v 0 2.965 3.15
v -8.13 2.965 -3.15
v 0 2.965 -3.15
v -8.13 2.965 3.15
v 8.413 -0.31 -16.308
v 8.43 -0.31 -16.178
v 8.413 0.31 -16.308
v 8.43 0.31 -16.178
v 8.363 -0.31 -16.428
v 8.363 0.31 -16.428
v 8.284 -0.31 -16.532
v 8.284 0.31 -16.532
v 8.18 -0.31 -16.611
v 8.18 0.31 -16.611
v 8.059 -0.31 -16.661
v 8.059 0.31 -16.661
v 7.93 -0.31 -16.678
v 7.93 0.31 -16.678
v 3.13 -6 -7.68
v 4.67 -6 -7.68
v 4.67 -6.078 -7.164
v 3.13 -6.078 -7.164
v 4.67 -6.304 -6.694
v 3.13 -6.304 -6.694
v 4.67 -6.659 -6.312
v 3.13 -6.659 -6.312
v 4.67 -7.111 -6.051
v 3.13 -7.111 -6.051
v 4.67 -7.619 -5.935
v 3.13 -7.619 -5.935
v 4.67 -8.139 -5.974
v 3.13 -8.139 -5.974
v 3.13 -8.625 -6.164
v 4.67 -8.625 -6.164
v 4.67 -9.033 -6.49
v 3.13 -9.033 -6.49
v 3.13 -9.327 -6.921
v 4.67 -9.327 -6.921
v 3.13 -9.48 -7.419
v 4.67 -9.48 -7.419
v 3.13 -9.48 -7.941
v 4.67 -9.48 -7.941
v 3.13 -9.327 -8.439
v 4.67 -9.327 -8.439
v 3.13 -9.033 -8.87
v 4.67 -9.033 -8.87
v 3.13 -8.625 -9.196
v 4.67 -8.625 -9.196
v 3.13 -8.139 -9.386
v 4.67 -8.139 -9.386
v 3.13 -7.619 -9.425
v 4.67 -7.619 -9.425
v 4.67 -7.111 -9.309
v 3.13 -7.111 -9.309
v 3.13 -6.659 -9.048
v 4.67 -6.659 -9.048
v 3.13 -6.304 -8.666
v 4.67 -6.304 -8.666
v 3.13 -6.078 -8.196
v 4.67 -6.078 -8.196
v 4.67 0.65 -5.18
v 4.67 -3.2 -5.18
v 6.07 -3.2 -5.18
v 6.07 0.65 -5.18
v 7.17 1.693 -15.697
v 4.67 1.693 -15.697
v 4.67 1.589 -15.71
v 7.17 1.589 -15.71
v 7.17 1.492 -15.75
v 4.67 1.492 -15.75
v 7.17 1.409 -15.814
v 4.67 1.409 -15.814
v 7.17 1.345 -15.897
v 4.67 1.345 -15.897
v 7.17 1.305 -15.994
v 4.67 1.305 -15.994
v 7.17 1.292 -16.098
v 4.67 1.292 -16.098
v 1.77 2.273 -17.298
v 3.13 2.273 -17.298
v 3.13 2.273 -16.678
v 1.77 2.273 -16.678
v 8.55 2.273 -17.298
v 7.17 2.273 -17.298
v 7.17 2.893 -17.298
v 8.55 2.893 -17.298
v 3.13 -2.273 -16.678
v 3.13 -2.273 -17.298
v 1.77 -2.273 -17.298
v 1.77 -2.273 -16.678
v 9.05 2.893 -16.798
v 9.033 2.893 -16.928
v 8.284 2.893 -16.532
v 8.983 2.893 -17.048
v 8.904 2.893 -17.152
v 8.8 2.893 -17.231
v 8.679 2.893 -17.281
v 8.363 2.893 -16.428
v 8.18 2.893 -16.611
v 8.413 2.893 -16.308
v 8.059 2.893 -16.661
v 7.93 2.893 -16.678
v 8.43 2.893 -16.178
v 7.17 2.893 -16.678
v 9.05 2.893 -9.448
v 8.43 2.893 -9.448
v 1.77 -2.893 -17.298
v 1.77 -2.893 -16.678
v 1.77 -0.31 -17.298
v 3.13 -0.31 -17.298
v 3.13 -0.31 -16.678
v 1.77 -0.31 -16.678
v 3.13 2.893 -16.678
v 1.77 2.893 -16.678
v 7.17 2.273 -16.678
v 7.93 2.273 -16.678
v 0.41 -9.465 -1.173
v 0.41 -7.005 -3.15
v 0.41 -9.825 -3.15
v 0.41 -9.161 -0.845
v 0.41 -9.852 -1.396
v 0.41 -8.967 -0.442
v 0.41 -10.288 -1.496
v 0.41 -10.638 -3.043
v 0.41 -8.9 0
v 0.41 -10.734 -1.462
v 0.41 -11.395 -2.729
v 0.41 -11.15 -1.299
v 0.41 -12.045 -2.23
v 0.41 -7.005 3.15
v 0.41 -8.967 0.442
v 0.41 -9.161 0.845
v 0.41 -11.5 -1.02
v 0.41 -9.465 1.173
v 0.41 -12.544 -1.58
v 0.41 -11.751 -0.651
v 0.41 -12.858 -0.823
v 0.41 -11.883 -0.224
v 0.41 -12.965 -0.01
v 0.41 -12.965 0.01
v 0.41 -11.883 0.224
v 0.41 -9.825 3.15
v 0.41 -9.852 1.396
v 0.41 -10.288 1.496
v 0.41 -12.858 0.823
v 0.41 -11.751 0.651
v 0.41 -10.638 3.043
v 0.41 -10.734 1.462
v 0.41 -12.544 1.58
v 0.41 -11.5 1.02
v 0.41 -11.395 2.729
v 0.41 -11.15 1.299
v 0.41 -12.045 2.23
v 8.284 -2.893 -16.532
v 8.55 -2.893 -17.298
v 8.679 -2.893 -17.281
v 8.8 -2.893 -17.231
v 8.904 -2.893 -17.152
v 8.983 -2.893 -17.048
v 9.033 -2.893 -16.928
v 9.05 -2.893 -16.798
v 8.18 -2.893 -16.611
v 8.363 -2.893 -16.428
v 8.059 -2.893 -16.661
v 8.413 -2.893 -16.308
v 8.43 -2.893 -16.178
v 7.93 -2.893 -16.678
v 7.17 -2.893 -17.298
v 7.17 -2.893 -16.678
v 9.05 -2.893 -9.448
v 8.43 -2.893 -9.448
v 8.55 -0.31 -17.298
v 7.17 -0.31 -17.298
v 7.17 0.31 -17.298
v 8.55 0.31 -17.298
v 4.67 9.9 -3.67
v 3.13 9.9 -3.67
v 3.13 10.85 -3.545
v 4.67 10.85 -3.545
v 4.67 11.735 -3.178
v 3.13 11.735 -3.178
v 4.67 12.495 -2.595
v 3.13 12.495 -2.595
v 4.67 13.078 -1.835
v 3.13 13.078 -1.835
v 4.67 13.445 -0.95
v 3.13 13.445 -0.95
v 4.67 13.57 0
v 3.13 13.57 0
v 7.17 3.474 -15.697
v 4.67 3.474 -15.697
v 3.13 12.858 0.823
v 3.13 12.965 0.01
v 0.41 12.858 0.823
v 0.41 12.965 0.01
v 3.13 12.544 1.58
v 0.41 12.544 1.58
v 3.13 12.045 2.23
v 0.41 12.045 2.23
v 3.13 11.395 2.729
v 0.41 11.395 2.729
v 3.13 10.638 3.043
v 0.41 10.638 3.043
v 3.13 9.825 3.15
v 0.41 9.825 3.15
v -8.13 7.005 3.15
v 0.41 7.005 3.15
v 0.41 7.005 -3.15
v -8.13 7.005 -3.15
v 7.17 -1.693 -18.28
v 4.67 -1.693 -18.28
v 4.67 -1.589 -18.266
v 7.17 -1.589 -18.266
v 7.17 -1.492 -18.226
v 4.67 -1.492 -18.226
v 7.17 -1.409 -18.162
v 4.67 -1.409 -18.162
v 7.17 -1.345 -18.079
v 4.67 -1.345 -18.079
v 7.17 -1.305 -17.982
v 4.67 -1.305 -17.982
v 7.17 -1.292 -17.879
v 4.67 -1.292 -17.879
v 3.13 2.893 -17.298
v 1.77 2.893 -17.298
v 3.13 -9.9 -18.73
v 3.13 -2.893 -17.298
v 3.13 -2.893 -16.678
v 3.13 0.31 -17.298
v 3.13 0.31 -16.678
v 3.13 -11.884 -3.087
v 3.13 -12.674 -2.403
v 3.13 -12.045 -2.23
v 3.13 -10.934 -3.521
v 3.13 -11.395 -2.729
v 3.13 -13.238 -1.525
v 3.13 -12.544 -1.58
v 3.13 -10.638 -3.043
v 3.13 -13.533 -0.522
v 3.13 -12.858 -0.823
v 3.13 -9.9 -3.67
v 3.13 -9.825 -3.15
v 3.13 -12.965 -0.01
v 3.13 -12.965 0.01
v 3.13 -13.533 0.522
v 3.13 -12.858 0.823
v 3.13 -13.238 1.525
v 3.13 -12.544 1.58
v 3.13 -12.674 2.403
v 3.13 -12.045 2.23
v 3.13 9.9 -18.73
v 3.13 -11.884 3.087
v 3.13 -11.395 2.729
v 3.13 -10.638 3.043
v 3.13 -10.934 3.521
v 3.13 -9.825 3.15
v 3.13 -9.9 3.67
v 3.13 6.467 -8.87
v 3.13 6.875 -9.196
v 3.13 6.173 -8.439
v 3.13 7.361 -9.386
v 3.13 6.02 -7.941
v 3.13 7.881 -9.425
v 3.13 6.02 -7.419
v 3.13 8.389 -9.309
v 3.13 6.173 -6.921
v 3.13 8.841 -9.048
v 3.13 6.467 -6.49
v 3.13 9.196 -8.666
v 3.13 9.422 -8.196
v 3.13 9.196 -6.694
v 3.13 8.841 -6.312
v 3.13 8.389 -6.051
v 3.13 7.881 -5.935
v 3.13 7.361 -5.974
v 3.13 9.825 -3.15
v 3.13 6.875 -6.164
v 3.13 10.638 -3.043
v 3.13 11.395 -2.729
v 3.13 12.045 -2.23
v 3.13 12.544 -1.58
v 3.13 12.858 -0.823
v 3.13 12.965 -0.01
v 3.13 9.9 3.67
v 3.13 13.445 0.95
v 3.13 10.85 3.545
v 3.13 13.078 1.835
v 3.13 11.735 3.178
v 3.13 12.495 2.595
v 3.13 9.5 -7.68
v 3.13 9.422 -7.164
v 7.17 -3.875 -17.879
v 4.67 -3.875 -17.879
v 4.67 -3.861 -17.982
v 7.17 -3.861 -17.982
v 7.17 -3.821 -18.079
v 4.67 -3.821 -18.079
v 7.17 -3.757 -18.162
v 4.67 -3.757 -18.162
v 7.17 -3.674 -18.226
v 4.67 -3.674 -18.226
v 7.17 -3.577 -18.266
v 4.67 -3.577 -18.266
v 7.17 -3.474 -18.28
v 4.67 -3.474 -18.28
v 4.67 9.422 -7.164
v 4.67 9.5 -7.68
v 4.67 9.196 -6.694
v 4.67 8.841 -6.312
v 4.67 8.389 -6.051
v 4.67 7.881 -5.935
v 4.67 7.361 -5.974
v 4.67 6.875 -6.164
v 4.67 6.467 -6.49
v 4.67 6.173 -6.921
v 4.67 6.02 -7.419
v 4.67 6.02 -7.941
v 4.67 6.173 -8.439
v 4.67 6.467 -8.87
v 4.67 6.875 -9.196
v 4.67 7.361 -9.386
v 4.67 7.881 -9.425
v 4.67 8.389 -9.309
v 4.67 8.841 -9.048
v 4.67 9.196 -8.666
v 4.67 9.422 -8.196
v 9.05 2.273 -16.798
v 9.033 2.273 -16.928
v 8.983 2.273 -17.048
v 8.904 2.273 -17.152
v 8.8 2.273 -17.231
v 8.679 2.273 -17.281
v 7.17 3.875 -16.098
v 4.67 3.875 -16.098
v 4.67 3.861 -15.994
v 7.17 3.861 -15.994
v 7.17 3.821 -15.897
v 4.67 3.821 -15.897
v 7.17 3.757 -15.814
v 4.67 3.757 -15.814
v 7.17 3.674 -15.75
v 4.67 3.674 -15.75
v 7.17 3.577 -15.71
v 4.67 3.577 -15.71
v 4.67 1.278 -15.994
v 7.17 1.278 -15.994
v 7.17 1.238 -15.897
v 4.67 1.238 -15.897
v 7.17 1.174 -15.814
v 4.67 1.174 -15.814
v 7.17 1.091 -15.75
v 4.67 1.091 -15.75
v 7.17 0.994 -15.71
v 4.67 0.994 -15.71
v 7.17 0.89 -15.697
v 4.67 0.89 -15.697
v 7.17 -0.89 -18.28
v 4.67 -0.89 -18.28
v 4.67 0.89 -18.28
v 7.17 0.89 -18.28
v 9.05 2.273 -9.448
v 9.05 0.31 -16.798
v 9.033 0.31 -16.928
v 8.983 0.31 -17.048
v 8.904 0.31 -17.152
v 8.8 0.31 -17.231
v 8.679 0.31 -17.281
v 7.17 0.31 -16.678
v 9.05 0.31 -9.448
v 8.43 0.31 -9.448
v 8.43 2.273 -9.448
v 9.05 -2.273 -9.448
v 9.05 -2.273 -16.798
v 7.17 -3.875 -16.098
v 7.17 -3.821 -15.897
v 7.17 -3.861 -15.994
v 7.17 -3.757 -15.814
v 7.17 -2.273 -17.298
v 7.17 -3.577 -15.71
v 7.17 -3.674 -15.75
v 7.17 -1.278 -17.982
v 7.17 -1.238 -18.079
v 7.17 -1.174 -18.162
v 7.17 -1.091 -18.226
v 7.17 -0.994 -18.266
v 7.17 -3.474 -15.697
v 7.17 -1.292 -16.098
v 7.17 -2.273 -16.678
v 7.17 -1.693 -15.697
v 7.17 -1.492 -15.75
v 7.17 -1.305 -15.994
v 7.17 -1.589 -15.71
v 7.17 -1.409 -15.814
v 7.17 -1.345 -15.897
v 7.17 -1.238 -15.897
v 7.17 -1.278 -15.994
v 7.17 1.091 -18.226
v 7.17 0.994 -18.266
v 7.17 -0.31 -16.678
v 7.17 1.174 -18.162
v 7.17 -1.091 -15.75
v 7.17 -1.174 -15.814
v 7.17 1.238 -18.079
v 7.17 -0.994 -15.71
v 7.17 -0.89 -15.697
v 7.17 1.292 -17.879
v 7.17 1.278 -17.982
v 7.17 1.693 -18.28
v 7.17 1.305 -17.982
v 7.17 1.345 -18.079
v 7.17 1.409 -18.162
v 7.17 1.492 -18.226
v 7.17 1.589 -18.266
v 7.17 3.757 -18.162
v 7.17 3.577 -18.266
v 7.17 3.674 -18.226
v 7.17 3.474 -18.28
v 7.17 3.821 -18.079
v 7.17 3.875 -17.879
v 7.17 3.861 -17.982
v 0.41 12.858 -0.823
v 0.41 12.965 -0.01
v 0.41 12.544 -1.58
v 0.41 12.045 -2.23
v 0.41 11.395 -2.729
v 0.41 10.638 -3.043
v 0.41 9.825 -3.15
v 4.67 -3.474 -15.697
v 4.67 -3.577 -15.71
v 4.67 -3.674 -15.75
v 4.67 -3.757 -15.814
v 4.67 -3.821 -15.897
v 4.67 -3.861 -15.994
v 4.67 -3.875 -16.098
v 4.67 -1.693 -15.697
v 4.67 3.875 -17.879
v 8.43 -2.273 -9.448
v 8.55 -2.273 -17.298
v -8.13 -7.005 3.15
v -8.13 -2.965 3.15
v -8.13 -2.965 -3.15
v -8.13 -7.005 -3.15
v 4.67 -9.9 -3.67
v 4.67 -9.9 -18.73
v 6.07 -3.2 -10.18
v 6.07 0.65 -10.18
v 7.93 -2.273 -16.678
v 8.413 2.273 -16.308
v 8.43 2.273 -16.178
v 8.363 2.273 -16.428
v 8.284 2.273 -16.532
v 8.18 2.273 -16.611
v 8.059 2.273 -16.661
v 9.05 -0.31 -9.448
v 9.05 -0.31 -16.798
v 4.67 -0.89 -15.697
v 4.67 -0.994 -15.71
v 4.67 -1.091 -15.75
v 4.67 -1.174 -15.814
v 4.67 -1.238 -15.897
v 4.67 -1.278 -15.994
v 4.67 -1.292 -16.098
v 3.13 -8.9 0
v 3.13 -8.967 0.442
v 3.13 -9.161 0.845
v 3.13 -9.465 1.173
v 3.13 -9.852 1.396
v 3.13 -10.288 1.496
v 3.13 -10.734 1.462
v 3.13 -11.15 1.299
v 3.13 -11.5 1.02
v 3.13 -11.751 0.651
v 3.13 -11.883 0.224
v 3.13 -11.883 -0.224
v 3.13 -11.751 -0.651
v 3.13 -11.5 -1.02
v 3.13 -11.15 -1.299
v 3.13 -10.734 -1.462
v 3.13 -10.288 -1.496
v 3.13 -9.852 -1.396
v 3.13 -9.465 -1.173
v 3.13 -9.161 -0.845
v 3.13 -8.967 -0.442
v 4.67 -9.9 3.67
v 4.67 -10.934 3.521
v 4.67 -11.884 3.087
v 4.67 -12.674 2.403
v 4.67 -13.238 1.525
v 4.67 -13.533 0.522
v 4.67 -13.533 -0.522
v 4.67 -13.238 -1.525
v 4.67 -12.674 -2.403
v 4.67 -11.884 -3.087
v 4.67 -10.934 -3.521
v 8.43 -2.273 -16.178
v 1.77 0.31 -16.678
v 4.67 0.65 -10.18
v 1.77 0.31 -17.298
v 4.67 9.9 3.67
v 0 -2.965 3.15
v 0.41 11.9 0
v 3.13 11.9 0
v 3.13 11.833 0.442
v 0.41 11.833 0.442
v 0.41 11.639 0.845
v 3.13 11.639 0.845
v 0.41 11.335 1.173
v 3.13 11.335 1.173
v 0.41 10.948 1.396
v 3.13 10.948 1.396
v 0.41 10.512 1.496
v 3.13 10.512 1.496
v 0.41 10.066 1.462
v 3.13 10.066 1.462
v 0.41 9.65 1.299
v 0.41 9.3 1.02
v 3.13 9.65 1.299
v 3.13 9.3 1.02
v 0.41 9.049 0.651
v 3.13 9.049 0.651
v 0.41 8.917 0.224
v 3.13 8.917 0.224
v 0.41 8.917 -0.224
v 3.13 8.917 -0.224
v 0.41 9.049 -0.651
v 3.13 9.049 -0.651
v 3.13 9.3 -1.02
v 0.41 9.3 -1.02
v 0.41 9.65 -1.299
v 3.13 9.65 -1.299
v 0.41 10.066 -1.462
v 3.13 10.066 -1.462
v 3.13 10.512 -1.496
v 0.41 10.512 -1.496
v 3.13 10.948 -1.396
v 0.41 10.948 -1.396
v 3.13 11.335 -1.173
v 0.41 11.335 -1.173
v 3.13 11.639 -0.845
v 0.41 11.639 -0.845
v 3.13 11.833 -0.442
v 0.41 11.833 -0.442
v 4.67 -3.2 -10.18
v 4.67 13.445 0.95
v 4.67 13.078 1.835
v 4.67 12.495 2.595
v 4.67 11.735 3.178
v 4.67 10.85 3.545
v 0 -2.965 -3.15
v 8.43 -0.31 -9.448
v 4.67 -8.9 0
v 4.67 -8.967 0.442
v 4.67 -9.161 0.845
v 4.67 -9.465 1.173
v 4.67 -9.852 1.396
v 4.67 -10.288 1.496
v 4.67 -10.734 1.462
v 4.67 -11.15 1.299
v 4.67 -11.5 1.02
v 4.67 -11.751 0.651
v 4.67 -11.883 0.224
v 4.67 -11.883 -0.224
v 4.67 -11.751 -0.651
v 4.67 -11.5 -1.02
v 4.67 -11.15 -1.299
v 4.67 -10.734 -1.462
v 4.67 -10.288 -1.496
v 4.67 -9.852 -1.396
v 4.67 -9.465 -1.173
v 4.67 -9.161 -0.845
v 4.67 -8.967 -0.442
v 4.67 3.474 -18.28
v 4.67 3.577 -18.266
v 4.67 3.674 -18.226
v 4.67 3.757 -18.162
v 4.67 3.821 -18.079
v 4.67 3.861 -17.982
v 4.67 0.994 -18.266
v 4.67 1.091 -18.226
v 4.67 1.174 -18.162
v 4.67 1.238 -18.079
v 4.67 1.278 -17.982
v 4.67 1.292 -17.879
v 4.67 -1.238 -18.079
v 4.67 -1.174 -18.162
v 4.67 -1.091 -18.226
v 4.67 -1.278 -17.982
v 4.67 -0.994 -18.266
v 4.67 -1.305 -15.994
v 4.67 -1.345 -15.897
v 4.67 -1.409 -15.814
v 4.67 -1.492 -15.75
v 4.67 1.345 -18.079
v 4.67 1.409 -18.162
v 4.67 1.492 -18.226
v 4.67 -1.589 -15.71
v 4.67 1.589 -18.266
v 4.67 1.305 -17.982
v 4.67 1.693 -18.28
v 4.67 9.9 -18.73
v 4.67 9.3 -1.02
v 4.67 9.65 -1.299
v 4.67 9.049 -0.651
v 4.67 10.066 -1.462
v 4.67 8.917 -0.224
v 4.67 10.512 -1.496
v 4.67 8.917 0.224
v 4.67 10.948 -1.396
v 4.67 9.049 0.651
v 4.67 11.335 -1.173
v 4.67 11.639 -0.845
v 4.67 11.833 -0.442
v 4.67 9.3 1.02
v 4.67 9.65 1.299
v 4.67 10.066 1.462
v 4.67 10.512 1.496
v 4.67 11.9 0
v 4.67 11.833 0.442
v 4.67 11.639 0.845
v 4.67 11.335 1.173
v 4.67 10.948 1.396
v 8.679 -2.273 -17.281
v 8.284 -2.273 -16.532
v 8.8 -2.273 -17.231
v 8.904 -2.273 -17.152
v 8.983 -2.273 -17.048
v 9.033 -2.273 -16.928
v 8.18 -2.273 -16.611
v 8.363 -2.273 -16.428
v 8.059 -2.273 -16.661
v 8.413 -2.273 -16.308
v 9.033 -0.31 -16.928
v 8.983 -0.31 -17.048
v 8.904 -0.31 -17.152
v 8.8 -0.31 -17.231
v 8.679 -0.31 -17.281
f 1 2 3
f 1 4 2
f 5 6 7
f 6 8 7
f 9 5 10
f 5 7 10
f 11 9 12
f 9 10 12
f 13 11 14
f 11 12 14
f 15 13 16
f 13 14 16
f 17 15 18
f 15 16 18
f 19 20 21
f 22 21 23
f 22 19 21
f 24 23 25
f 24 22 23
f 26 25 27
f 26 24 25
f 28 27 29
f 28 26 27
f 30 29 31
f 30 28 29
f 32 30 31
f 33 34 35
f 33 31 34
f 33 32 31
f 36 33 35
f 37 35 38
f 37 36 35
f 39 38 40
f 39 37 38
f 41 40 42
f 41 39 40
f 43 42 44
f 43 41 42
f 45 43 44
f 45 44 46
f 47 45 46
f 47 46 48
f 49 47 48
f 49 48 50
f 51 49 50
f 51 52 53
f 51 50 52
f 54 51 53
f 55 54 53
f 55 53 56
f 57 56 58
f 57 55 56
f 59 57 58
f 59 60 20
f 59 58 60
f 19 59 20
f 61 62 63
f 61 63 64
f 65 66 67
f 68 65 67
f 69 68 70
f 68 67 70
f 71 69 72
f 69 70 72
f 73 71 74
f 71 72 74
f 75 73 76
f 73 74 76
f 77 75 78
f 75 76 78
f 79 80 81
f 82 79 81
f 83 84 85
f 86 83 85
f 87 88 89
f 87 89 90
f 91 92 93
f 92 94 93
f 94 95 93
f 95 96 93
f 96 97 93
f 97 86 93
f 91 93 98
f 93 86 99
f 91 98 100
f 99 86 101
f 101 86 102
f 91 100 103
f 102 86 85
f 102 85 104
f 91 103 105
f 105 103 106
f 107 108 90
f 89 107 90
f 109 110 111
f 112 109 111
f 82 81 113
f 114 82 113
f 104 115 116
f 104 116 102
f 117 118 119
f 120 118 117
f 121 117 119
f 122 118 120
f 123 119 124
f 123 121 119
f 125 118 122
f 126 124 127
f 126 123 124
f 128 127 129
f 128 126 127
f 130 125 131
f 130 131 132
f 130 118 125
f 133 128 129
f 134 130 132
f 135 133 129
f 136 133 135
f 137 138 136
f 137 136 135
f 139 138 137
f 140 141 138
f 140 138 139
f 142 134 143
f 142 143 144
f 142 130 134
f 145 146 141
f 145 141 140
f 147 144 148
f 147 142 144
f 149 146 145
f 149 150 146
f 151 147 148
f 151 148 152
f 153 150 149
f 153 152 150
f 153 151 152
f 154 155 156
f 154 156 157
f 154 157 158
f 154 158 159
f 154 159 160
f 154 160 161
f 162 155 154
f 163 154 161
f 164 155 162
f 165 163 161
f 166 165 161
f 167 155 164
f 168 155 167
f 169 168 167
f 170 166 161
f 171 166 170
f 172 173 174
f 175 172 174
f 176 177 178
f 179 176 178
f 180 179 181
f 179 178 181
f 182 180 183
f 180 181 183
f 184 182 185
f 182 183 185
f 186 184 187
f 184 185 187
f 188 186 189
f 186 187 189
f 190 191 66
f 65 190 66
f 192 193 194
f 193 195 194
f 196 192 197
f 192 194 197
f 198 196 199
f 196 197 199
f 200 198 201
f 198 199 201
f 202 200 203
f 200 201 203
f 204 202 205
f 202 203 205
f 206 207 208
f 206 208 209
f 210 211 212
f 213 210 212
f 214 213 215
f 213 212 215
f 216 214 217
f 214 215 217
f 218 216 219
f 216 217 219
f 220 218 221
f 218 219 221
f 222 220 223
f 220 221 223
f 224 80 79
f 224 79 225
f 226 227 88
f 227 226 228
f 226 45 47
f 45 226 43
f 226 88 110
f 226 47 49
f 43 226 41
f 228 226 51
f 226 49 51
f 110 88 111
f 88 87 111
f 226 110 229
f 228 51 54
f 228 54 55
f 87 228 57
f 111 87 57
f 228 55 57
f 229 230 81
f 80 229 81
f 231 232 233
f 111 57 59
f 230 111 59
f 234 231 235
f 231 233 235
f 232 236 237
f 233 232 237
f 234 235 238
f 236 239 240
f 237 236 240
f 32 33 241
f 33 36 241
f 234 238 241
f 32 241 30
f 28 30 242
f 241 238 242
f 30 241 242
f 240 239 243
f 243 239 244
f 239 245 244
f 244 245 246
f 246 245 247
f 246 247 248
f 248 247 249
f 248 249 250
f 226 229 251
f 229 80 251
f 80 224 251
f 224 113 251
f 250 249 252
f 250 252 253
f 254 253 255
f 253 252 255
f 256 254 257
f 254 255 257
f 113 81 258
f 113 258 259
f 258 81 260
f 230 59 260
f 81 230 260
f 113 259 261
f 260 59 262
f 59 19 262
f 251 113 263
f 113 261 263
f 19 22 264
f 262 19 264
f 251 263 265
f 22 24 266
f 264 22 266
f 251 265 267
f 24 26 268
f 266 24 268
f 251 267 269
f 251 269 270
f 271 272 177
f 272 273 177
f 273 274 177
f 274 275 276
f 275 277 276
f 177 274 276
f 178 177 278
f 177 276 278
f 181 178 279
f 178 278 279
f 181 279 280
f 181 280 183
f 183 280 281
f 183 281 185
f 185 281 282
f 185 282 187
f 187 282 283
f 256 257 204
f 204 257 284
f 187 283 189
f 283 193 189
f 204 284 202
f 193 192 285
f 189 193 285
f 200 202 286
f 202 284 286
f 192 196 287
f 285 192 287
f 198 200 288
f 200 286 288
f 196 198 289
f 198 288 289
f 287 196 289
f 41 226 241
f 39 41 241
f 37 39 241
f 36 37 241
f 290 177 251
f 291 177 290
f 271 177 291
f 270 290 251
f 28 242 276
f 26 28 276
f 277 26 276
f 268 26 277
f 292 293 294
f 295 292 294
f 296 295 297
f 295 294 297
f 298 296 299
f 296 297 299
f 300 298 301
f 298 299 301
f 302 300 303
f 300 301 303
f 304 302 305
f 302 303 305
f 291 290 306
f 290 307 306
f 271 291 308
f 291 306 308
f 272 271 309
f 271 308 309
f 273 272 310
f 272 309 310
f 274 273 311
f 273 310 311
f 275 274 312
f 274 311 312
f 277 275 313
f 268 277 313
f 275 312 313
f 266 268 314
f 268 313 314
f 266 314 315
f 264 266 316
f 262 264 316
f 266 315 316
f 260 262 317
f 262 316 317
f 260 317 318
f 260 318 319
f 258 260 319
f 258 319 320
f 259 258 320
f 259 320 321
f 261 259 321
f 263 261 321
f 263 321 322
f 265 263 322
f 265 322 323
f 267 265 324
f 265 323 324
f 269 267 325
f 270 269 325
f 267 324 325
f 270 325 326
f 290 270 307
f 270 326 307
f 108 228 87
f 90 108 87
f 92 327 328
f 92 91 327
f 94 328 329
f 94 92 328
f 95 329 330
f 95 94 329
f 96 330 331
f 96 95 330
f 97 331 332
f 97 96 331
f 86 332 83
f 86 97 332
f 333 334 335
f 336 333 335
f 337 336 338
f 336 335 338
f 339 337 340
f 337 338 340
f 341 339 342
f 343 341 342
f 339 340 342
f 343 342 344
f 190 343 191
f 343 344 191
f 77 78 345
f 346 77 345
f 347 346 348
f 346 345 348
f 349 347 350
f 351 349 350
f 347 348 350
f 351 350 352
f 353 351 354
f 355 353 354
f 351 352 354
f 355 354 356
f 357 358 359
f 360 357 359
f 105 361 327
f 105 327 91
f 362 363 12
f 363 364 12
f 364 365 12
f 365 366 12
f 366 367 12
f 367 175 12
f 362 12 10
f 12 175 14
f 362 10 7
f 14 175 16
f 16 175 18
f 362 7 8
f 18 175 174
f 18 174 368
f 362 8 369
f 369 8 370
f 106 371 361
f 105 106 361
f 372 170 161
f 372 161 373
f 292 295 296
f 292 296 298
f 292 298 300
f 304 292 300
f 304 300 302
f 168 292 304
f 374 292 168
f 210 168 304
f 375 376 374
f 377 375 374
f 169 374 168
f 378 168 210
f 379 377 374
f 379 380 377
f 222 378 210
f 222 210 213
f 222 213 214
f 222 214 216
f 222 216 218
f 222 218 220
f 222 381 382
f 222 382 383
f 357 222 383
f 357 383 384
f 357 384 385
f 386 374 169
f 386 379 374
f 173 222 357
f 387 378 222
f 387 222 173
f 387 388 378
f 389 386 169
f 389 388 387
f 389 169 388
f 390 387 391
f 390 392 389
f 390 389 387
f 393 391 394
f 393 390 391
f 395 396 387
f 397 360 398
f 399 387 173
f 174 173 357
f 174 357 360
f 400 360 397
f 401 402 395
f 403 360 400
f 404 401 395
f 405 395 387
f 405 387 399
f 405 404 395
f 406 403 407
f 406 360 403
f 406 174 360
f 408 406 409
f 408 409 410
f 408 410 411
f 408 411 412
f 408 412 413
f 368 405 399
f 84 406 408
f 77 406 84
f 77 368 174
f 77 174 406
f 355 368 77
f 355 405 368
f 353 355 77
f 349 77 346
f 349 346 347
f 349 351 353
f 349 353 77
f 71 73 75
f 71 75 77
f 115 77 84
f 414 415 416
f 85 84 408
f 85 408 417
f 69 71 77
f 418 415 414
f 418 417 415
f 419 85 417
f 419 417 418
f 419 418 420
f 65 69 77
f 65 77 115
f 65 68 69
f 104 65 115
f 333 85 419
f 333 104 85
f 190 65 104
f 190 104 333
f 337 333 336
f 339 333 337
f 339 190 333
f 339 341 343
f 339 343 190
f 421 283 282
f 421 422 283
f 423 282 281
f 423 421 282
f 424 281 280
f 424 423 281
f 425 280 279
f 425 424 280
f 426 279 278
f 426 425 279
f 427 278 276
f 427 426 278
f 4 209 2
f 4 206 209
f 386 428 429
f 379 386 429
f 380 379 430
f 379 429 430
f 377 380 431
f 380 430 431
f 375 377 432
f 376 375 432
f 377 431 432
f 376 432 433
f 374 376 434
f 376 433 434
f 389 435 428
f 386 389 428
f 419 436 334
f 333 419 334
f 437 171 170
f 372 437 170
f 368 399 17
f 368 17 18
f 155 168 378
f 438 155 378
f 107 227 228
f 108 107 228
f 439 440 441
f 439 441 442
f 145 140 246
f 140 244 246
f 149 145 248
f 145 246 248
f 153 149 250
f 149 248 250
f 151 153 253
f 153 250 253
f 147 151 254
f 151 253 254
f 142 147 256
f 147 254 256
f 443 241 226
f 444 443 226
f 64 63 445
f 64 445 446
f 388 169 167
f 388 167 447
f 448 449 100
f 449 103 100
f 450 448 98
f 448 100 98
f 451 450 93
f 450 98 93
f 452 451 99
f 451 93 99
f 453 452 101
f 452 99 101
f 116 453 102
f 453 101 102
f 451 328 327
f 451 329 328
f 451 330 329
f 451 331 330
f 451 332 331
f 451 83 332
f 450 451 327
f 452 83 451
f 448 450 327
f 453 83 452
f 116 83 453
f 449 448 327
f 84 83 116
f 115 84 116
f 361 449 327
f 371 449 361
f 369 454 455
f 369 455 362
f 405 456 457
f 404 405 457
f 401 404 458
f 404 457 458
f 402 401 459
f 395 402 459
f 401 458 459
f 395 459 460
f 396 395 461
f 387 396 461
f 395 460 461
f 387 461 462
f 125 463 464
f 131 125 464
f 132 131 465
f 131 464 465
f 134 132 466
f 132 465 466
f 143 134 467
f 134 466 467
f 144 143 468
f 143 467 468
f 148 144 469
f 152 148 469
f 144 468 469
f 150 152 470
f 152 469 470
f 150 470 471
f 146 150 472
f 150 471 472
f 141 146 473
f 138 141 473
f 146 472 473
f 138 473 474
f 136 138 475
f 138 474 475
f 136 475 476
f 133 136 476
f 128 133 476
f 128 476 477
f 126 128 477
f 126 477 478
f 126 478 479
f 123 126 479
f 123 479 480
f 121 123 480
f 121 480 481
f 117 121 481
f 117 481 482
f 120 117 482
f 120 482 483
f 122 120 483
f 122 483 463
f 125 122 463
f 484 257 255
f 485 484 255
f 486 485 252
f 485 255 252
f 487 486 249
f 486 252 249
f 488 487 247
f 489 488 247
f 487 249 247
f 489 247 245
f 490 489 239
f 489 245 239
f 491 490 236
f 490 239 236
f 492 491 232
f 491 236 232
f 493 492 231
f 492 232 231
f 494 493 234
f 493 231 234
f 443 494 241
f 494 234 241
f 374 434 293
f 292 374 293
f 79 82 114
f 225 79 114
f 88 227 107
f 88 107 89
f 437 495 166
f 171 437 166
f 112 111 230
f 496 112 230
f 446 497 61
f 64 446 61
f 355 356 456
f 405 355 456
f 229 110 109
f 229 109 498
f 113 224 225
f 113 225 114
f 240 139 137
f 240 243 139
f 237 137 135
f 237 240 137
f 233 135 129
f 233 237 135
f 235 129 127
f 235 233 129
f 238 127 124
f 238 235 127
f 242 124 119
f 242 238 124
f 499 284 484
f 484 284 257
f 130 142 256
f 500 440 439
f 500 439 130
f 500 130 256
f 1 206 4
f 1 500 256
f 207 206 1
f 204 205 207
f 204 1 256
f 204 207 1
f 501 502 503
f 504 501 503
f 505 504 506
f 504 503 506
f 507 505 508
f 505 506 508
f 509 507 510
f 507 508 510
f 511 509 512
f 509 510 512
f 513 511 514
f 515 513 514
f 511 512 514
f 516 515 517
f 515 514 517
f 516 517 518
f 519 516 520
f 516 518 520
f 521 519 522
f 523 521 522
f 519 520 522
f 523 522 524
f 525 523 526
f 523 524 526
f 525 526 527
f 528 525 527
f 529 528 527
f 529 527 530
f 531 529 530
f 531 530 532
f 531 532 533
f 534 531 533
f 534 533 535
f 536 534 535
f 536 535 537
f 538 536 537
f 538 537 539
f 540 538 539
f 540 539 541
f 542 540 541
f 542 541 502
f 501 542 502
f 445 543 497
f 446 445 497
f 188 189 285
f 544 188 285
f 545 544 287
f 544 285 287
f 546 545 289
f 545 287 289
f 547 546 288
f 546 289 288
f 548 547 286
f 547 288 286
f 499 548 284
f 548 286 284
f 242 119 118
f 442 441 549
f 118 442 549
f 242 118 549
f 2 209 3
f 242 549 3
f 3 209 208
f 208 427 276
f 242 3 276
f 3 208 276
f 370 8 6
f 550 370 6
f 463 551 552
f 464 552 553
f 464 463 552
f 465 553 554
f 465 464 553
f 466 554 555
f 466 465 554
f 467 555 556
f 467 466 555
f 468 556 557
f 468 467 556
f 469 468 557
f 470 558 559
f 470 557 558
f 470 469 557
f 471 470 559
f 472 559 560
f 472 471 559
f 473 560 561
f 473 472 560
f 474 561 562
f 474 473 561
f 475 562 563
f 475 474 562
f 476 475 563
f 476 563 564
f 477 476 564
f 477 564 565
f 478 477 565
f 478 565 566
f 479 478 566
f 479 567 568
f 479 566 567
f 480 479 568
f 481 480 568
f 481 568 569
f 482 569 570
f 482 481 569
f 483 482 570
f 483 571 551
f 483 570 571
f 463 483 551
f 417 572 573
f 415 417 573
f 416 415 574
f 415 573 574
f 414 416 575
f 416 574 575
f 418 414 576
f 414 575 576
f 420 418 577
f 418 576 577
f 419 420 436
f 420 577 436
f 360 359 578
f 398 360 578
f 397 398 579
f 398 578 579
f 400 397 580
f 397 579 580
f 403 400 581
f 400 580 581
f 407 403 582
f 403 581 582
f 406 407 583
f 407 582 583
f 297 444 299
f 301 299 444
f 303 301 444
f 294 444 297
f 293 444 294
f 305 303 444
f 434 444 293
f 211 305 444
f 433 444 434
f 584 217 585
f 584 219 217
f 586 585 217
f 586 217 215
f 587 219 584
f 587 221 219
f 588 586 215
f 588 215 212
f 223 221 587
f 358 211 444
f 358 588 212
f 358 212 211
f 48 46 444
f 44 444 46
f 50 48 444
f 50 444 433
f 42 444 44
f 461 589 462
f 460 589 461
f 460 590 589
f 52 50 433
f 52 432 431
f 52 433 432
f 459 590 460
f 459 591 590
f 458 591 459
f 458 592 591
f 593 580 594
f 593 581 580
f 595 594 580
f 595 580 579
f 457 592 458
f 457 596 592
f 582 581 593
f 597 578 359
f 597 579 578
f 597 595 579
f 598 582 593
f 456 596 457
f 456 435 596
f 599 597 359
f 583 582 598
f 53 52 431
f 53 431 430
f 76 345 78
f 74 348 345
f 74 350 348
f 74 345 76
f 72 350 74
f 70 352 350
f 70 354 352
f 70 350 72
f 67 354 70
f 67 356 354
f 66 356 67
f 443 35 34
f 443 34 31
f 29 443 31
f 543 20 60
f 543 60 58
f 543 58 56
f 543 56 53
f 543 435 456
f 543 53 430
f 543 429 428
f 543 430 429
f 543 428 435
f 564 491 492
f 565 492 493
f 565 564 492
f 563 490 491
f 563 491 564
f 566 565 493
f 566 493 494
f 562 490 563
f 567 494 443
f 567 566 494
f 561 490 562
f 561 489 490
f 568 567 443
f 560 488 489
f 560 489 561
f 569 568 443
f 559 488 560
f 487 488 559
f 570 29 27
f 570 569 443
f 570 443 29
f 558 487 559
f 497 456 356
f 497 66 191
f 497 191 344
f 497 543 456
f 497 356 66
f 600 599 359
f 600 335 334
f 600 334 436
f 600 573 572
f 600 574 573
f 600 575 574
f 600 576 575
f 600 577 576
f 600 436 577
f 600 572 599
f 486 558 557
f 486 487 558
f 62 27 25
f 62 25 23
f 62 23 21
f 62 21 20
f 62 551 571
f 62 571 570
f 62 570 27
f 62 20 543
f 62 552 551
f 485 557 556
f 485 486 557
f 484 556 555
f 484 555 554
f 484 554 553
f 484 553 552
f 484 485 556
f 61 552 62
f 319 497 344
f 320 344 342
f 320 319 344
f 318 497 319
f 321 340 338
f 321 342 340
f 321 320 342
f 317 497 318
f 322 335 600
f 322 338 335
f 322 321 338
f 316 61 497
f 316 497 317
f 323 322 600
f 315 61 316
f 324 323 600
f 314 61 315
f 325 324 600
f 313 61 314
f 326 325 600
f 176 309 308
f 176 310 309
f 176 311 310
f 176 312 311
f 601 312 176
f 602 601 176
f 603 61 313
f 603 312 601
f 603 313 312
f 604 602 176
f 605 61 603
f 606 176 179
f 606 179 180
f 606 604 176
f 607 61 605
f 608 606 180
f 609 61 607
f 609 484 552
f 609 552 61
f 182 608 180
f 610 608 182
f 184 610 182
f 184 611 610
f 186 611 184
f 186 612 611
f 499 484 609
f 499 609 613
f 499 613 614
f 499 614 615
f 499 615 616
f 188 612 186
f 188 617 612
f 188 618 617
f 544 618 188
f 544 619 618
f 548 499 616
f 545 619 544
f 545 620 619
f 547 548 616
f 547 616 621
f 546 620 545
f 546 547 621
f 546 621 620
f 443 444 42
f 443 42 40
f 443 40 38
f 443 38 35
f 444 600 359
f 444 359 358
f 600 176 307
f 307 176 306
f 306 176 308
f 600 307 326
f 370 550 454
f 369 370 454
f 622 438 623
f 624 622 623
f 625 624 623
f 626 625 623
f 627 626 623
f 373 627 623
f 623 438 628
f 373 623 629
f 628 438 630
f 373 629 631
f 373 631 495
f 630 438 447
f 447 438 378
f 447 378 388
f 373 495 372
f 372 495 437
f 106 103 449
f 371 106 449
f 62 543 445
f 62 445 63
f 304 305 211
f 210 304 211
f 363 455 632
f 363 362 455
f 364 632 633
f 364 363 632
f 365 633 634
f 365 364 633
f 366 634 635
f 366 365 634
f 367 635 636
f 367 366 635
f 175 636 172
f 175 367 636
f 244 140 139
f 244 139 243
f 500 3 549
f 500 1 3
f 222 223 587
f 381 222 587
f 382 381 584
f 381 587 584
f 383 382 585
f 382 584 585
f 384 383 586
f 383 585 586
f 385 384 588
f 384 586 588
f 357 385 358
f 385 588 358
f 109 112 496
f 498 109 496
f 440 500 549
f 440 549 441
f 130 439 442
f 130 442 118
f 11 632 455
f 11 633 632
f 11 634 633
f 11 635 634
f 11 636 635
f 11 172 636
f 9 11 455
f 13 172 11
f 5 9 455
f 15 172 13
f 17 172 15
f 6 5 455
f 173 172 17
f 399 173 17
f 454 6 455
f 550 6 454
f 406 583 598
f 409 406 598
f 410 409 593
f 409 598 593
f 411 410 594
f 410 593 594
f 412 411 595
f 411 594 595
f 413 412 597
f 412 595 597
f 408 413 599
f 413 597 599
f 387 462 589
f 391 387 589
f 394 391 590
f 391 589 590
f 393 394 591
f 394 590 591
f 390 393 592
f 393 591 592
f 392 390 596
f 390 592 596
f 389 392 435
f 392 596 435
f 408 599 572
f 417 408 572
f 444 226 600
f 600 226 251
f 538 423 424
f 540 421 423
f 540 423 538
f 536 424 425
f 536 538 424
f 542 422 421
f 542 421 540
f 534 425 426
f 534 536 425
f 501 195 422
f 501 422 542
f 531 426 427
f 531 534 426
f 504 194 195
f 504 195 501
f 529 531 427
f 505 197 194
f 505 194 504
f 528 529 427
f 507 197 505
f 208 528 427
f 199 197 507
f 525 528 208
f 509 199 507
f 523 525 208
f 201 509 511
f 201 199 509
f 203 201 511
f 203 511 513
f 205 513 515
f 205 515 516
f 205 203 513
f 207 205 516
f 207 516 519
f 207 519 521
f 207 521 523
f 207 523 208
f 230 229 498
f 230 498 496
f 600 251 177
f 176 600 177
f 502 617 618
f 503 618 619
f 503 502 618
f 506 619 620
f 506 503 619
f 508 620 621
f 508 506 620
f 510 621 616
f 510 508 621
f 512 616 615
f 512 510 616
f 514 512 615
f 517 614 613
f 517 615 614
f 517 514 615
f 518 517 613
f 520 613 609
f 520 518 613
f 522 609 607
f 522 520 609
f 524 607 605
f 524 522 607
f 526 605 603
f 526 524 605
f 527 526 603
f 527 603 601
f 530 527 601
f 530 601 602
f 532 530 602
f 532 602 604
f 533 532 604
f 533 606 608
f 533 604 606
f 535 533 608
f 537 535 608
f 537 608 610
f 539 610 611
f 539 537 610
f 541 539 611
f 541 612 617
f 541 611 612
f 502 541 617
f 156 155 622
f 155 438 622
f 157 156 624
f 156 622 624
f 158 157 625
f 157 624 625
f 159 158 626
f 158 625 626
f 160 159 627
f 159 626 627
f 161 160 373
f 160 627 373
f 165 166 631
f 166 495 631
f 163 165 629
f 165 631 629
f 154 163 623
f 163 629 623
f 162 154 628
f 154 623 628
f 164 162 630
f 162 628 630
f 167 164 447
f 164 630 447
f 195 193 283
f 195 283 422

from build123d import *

# Parameters (mm, degrees)
F1_DEPTH  = 3.15
F2_R      = 3.14
F5_DEPTH  = 1.54
F4_R      = 1.5
F4_R_2    = 1.75
F6_DEPTH  = 12.5
F8_DEPTH  = 2.5
F9_W      = 0.62
F9_H      = 0.62
F10_DEPTH = 1.88
F11_W     = 0.62
F11_H     = 0.62
F12_DEPTH = 1.36
F13_W     = 0.62
F13_H     = 0.62
F14_DEPTH = 7.85
F15_R     = 0.5
F16_W     = 3.85
F16_H     = 5
F17_DEPTH = 1.4


with BuildPart() as f1:
    # F0 (on Top) → F1 (new body, symmetric)
    with BuildSketch(Plane.XY):
        Polygon((0, 2.965), (0, 0), (0, -2.965), (-8.13, -2.965), (-8.13, -7.005), (0.41, -7.005), (0.41, -12.965), (3.13, -12.965), (3.13, 0), (3.13, 12.965), (0.41, 12.965), (0.41, 7.005), (-8.13, 7.005), (-8.13, 2.965), align=None)
    extrude(amount=F1_DEPTH, both=True)

    # F2
    f2_edges = [f1.edges().sort_by_distance(p)[0] for p in [
        (1.77, 12.965, 3.15),
        (1.77, 12.965, -3.15),
        (1.77, -12.965, 3.15),
        (1.77, -12.965, -3.15),
    ]]
    fillet(f2_edges, radius=F2_R)

    # F3 (on face) → F5 (join)
    with BuildSketch(Plane.YZ.offset(3.13)):
        with BuildLine():
            Line((-9.9, -3.67), (-9.9, -18.73))
            Line((-9.9, -18.73), (9.9, -18.73))
            Line((9.9, -18.73), (9.9, -3.67))
            ThreePointArc((9.9, -3.67), (6.23, 0), (9.9, 3.67))
            Line((9.9, 3.67), (-9.9, 3.67))
            ThreePointArc((-9.9, 3.67), (-7.304918, 2.595082), (-6.23, 0))
            ThreePointArc((-6.23, 0), (-7.304918, -2.595082), (-9.9, -3.67))
        make_face()
        with BuildLine():
            ThreePointArc((-9.9, 3.67), (-13.57, 0), (-9.9, -3.67))
            ThreePointArc((-9.9, -3.67), (-7.304918, -2.595082), (-6.23, 0))
            ThreePointArc((-6.23, 0), (-7.304918, 2.595082), (-9.9, 3.67))
        make_face()
        with BuildLine():
            ThreePointArc((9.9, 3.67), (6.23, 0), (9.9, -3.67))
            ThreePointArc((9.9, -3.67), (12.495082, -2.595082), (13.57, 0))
            ThreePointArc((13.57, 0), (12.495082, 2.595082), (9.9, 3.67))
        make_face()
    extrude(amount=F5_DEPTH)

    # F4 (on face) → F6 (cut, symmetric)
    with BuildSketch(Plane.YZ.offset(3.13)):
        with Locations((-10.4, 0)):
            Circle(F4_R)
        with Locations((10.4, 0)):
            Circle(F4_R)
        with Locations((-7.75, -7.68)):
            Circle(F4_R_2)
        with Locations((7.75, -7.68)):
            Circle(F4_R_2)
    extrude(amount=F6_DEPTH, both=True, mode=Mode.SUBTRACT)

    # F7 (on face) → F8 (join)
    with BuildSketch(Plane.YZ.offset(4.67)):
        with BuildLine():
            ThreePointArc((1.291667, -16.098165), (1.174071, -15.814263), (0.890169, -15.696667))
            Line((0.890169, -15.696667), (-0.890169, -15.696667))
            ThreePointArc((-0.890169, -15.696667), (-1.174071, -15.814263), (-1.291667, -16.098165))
            Line((-1.291667, -16.098165), (-1.291667, -17.878502))
            ThreePointArc((-1.291667, -17.878502), (-1.174071, -18.162404), (-0.890169, -18.28))
            Line((-0.890169, -18.28), (0.890169, -18.28))
            ThreePointArc((0.890169, -18.28), (1.174071, -18.162404), (1.291667, -17.878502))
            Line((1.291667, -17.878502), (1.291667, -16.098165))
        make_face()
        with BuildLine():
            ThreePointArc((1.693165, -15.696667), (1.409263, -15.814263), (1.291667, -16.098165))
            Line((1.291667, -16.098165), (1.291667, -17.878502))
            ThreePointArc((1.291667, -17.878502), (1.409263, -18.162404), (1.693165, -18.28))
            Line((1.693165, -18.28), (3.473502, -18.28))
            ThreePointArc((3.473502, -18.28), (3.757404, -18.162404), (3.875, -17.878502))
            Line((3.875, -17.878502), (3.875, -16.098165))
            ThreePointArc((3.875, -16.098165), (3.757404, -15.814263), (3.473502, -15.696667))
            Line((3.473502, -15.696667), (1.693165, -15.696667))
        make_face()
        with BuildLine():
            Line((-1.291667, -17.878502), (-1.291667, -16.098165))
            ThreePointArc((-1.291667, -16.098165), (-1.409263, -15.814263), (-1.693165, -15.696667))
            Line((-1.693165, -15.696667), (-3.473502, -15.696667))
            ThreePointArc((-3.473502, -15.696667), (-3.757404, -15.814263), (-3.875, -16.098165))
            Line((-3.875, -16.098165), (-3.875, -17.878502))
            ThreePointArc((-3.875, -17.878502), (-3.757404, -18.162404), (-3.473502, -18.28))
            Line((-3.473502, -18.28), (-1.693165, -18.28))
            ThreePointArc((-1.693165, -18.28), (-1.409263, -18.162404), (-1.291667, -17.878502))
        make_face()
    extrude(amount=F8_DEPTH)

    # F9 (on face) → F10 (join)
    with BuildSketch(Plane.YZ.offset(7.17)):
        with Locations((0, -16.988333)):
            Rectangle(F9_W, F9_H)
        with Locations((2.583333, -16.988333)):
            Rectangle(F9_W, F9_H)
        with Locations((-2.583333, -16.988333)):
            Rectangle(F9_W, F9_H)
    extrude(amount=F10_DEPTH)

    # F11 (on face) → F12 (join)
    with BuildSketch(Plane.YZ.offset(3.13)):
        with Locations((-2.583333, -16.988333)):
            Rectangle(F11_W, F11_H)
        with Locations((0, -16.988333)):
            Rectangle(F11_W, F11_H)
        with Locations((2.583333, -16.988333)):
            Rectangle(F11_W, F11_H)
    extrude(amount=-F12_DEPTH)

    # F13 (on face) → F14 (join)
    with BuildSketch(Plane(origin=(0, 0, -17.298333), x_dir=(1, 0, 0), z_dir=(0, 0, -1))):
        with Locations((8.74, 2.583333)):
            Rectangle(F13_W, F13_H)
        with Locations((8.74, 0)):
            Rectangle(F13_W, F13_H)
        with Locations((8.74, -2.583333)):
            Rectangle(F13_W, F13_H)
    extrude(amount=-F14_DEPTH)

    # F15
    f15_edges = [f1.edges().sort_by_distance(p)[0] for p in [
        (9.05, 2.583333, -17.298333),
        (9.05, 0, -17.298333),
        (9.05, -2.583333, -17.298333),
        (8.43, 2.583333, -16.678333),
        (8.43, 0, -16.678333),
        (8.43, -2.583333, -16.678333),
    ]]
    fillet(f15_edges, radius=F15_R)

    # F16 (on face) → F17 (join)
    with BuildSketch(Plane.YZ.offset(4.67)):
        with Locations((-1.275, -7.68)):
            Rectangle(F16_W, F16_H)
    extrude(amount=F17_DEPTH)


solid = f1.part
